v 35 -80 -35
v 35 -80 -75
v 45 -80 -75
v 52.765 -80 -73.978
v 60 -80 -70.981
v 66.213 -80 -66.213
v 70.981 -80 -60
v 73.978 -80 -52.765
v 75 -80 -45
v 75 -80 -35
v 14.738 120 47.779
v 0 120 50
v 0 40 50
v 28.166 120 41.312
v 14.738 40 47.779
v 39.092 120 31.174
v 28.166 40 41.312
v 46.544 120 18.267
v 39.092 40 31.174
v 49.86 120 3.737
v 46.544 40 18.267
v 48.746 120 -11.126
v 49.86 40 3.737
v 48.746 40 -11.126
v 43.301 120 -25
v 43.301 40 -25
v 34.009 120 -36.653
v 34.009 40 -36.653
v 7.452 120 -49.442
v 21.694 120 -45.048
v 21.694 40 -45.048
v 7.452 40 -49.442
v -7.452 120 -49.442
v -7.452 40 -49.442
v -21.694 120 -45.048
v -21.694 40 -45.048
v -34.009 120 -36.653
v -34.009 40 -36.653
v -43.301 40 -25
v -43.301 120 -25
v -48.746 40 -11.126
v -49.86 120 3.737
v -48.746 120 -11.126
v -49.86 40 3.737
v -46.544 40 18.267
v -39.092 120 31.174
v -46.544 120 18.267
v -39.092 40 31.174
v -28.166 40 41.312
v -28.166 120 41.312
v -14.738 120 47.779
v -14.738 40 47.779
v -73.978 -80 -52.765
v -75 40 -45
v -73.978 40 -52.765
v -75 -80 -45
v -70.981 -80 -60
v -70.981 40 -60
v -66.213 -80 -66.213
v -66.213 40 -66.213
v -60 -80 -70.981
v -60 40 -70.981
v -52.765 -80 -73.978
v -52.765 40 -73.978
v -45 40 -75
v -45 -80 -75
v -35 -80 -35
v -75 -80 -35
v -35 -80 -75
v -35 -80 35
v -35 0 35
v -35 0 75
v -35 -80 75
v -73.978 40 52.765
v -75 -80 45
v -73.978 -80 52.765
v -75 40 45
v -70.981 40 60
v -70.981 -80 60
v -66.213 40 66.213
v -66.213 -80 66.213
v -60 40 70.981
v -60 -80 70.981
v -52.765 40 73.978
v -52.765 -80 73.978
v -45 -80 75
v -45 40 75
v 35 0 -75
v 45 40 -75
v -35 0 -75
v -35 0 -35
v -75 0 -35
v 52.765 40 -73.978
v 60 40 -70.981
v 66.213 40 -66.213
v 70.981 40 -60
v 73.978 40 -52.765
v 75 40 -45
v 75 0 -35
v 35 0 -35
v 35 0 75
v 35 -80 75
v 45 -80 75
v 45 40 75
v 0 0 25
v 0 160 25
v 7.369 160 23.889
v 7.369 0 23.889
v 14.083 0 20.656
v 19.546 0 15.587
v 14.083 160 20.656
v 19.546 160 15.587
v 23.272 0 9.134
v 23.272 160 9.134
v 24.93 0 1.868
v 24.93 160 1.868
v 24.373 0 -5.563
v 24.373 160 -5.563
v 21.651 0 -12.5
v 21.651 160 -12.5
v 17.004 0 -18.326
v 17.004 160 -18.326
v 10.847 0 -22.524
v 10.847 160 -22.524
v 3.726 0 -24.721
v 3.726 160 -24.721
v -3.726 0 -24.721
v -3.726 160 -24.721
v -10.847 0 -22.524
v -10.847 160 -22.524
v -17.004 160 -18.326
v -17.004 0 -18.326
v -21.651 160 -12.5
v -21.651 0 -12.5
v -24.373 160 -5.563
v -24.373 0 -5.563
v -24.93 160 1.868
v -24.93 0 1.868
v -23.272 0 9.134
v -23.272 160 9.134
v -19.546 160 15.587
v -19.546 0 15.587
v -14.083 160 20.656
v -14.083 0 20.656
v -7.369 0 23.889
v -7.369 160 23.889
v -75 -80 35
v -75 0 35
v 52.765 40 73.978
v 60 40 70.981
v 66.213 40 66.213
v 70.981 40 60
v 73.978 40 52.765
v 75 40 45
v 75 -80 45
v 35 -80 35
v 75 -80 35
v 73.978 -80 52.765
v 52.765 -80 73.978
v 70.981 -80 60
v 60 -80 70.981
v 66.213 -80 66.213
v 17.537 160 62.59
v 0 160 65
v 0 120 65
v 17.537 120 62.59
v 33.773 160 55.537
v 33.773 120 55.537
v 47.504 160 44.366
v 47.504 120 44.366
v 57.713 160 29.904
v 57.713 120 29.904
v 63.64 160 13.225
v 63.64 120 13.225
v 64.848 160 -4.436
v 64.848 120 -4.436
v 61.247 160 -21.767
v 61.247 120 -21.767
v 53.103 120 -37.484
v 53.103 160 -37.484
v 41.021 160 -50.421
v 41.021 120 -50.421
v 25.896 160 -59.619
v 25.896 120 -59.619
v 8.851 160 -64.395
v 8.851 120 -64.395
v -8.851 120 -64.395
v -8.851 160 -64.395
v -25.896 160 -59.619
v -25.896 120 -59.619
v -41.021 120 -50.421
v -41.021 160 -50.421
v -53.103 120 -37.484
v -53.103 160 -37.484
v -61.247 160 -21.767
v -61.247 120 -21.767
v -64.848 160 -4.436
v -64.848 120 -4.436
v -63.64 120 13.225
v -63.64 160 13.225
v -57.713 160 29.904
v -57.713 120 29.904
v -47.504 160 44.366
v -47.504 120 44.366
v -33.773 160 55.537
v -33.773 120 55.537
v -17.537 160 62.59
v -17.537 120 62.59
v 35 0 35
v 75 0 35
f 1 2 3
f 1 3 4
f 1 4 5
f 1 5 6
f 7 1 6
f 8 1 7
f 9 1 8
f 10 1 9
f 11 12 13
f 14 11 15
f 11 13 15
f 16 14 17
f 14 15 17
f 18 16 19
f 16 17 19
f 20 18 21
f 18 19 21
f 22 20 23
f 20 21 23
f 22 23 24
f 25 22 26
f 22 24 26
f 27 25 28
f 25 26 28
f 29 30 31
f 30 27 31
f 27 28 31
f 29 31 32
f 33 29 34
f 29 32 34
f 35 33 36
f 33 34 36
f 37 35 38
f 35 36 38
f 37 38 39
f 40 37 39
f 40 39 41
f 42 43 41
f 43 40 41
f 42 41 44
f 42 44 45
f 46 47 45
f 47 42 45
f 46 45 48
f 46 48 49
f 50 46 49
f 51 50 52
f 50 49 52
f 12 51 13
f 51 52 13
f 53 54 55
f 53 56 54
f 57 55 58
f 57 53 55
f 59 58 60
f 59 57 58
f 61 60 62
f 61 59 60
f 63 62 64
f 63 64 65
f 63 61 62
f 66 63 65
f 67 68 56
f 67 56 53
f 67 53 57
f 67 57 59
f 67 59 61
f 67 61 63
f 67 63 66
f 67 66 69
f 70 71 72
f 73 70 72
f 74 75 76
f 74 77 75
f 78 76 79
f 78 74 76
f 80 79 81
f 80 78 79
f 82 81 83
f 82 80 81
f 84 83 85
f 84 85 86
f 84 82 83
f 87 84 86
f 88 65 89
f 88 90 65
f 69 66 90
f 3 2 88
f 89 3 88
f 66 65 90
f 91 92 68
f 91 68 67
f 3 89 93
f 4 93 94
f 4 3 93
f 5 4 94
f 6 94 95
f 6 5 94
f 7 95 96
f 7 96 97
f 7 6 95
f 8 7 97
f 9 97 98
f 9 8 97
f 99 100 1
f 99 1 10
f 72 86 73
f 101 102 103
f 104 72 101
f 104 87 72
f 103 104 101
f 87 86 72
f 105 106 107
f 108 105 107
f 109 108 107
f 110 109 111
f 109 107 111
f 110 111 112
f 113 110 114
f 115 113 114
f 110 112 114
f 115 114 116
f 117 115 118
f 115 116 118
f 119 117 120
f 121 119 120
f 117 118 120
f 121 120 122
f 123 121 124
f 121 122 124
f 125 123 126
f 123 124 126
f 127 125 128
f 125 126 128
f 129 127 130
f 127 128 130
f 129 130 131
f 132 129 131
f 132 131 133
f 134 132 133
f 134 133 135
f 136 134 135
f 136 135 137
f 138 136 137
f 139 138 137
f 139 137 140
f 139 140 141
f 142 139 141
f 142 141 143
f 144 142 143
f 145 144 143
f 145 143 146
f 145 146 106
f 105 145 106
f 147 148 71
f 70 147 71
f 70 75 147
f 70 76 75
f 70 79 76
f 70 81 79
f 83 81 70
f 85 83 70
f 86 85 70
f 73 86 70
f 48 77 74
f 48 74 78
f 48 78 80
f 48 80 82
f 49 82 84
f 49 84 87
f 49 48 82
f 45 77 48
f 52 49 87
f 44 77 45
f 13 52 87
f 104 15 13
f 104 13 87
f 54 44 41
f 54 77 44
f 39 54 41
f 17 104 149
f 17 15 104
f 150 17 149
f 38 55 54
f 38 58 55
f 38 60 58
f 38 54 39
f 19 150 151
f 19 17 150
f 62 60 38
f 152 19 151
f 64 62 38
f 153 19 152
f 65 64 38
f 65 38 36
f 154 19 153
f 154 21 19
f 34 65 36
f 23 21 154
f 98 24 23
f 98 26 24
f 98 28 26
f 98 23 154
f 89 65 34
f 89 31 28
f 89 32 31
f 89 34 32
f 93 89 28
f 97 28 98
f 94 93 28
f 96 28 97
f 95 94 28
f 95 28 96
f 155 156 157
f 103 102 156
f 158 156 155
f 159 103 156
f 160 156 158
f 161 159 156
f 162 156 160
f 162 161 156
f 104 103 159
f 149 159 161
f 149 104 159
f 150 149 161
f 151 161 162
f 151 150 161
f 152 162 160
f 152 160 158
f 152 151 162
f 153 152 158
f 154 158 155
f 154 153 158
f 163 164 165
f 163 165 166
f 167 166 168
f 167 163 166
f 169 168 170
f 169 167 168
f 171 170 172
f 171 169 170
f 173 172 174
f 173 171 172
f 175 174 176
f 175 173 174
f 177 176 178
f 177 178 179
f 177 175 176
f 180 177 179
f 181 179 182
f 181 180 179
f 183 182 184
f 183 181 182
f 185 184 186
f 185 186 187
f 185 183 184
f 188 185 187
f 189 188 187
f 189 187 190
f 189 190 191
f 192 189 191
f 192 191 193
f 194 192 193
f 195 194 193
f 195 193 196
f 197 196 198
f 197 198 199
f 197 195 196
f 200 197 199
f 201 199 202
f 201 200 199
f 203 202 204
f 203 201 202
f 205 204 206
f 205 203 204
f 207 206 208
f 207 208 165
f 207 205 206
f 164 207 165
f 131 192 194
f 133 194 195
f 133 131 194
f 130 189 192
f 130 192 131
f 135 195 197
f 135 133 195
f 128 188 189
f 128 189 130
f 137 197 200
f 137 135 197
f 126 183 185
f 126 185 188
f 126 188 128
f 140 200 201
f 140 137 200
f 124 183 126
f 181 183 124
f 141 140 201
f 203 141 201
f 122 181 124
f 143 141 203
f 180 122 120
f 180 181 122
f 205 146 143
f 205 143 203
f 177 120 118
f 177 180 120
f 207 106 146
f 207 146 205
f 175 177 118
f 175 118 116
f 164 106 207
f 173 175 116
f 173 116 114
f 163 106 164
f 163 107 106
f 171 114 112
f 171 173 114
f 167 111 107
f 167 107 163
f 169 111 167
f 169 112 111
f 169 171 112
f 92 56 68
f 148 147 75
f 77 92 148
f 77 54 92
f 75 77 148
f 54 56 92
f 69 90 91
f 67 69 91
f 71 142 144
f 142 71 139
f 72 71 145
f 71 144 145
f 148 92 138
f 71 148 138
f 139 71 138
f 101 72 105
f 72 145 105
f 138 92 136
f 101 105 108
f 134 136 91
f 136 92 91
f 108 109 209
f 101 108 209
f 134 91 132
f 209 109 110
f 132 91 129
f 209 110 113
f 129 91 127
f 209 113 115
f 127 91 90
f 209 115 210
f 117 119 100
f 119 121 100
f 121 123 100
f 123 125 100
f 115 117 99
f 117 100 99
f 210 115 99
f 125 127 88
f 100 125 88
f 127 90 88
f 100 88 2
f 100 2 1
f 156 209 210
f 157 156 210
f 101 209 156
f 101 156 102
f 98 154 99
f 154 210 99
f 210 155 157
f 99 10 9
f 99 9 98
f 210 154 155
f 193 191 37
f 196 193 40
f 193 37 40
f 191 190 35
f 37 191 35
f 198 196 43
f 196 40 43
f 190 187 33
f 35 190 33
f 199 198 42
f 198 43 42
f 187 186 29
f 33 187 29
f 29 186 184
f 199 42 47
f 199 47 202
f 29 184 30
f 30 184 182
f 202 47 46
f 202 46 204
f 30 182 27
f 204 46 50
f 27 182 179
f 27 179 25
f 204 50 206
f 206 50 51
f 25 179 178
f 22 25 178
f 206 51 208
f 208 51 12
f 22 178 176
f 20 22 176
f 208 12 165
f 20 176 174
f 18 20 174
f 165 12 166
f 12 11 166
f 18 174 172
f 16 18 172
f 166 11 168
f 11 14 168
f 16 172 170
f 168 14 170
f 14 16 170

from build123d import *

# Parameters (mm, degrees)
CROQUIS2_W              = 150
CROQUIS2_H              = 150
SALIENTE_EXTRUIR2_DEPTH = 40
CROQUIS3_W              = 40
CROQUIS3_H              = 40
SALIENTE_EXTRUIR3_DEPTH = 80
CROQUIS4_R              = 50
SALIENTE_EXTRUIR4_DEPTH = 120
CROQUIS5_R              = 25
CORTAR_EXTRUIR1_DEPTH   = 221
REDONDEO1_R             = 30
CROQUIS6_R              = 65
SALIENTE_EXTRUIR5_DEPTH = 40
CROQUIS7_R              = 25
CORTAR_EXTRUIR2_DEPTH   = 125


with BuildPart() as part:
    # Croquis2 → Saliente-Extruir2 (new body)
    with BuildSketch(Plane(origin=(0, 0, 0), x_dir=(1, 0, 0), z_dir=(0, 1, 0))):
        Rectangle(CROQUIS2_W, CROQUIS2_H)
    extrude(amount=SALIENTE_EXTRUIR2_DEPTH)

    # Croquis3 → Saliente-Extruir3 (add)
    with BuildSketch(Plane.XZ):
        with Locations((-55, 55)):
            Rectangle(CROQUIS3_W, CROQUIS3_H)
        with Locations((55, 55)):
            Rectangle(CROQUIS3_W, CROQUIS3_H)
        with Locations((-55, -55)):
            Rectangle(CROQUIS3_W, CROQUIS3_H)
        with Locations((55, -55)):
            Rectangle(CROQUIS3_W, CROQUIS3_H)
    extrude(amount=SALIENTE_EXTRUIR3_DEPTH)

    # Croquis4 → Saliente-Extruir4 (add)
    with BuildSketch(Plane(origin=(0, 40, 0), x_dir=(1, 0, 0), z_dir=(0, 1, 0))):
        with Locations(Location((0, 0, 0), (0, 0, 270))):
            Circle(CROQUIS4_R)
    extrude(amount=SALIENTE_EXTRUIR4_DEPTH)

    # Croquis5 → Cortar-Extruir1 (cut)
    with BuildSketch(Plane(origin=(0, 160, 0), x_dir=(1, 0, 0), z_dir=(0, 1, 0))):
        with Locations(Location((0, 0, 0), (0, 0, 270))):
            Circle(CROQUIS5_R)
    extrude(amount=-CORTAR_EXTRUIR1_DEPTH, mode=Mode.SUBTRACT)

    # Redondeo1
    redondeo1_edges = [part.edges().sort_by_distance(p)[0] for p in [
        (-75, -20, -75),
        (75, -20, -75),
        (75, -20, 75),
        (-75, -20, 75),
    ]]
    fillet(redondeo1_edges, radius=REDONDEO1_R)

    # Croquis6 → Saliente-Extruir5 (add)
    with BuildSketch(Plane(origin=(0, 160, 0), x_dir=(1, 0, 0), z_dir=(0, 1, 0))):
        with Locations(Location((0, 0, 0), (0, 0, 270))):
            Circle(CROQUIS6_R)
    extrude(amount=-SALIENTE_EXTRUIR5_DEPTH)

    # Croquis7 → Cortar-Extruir2 (cut)
    with BuildSketch(Plane(origin=(0, 160, 0), x_dir=(1, 0, 0), z_dir=(0, 1, 0))):
        with Locations(Location((0, 0, 0), (0, 0, 270))):
            Circle(CROQUIS7_R)
    extrude(amount=-CORTAR_EXTRUIR2_DEPTH, mode=Mode.SUBTRACT)


solid = part.part
